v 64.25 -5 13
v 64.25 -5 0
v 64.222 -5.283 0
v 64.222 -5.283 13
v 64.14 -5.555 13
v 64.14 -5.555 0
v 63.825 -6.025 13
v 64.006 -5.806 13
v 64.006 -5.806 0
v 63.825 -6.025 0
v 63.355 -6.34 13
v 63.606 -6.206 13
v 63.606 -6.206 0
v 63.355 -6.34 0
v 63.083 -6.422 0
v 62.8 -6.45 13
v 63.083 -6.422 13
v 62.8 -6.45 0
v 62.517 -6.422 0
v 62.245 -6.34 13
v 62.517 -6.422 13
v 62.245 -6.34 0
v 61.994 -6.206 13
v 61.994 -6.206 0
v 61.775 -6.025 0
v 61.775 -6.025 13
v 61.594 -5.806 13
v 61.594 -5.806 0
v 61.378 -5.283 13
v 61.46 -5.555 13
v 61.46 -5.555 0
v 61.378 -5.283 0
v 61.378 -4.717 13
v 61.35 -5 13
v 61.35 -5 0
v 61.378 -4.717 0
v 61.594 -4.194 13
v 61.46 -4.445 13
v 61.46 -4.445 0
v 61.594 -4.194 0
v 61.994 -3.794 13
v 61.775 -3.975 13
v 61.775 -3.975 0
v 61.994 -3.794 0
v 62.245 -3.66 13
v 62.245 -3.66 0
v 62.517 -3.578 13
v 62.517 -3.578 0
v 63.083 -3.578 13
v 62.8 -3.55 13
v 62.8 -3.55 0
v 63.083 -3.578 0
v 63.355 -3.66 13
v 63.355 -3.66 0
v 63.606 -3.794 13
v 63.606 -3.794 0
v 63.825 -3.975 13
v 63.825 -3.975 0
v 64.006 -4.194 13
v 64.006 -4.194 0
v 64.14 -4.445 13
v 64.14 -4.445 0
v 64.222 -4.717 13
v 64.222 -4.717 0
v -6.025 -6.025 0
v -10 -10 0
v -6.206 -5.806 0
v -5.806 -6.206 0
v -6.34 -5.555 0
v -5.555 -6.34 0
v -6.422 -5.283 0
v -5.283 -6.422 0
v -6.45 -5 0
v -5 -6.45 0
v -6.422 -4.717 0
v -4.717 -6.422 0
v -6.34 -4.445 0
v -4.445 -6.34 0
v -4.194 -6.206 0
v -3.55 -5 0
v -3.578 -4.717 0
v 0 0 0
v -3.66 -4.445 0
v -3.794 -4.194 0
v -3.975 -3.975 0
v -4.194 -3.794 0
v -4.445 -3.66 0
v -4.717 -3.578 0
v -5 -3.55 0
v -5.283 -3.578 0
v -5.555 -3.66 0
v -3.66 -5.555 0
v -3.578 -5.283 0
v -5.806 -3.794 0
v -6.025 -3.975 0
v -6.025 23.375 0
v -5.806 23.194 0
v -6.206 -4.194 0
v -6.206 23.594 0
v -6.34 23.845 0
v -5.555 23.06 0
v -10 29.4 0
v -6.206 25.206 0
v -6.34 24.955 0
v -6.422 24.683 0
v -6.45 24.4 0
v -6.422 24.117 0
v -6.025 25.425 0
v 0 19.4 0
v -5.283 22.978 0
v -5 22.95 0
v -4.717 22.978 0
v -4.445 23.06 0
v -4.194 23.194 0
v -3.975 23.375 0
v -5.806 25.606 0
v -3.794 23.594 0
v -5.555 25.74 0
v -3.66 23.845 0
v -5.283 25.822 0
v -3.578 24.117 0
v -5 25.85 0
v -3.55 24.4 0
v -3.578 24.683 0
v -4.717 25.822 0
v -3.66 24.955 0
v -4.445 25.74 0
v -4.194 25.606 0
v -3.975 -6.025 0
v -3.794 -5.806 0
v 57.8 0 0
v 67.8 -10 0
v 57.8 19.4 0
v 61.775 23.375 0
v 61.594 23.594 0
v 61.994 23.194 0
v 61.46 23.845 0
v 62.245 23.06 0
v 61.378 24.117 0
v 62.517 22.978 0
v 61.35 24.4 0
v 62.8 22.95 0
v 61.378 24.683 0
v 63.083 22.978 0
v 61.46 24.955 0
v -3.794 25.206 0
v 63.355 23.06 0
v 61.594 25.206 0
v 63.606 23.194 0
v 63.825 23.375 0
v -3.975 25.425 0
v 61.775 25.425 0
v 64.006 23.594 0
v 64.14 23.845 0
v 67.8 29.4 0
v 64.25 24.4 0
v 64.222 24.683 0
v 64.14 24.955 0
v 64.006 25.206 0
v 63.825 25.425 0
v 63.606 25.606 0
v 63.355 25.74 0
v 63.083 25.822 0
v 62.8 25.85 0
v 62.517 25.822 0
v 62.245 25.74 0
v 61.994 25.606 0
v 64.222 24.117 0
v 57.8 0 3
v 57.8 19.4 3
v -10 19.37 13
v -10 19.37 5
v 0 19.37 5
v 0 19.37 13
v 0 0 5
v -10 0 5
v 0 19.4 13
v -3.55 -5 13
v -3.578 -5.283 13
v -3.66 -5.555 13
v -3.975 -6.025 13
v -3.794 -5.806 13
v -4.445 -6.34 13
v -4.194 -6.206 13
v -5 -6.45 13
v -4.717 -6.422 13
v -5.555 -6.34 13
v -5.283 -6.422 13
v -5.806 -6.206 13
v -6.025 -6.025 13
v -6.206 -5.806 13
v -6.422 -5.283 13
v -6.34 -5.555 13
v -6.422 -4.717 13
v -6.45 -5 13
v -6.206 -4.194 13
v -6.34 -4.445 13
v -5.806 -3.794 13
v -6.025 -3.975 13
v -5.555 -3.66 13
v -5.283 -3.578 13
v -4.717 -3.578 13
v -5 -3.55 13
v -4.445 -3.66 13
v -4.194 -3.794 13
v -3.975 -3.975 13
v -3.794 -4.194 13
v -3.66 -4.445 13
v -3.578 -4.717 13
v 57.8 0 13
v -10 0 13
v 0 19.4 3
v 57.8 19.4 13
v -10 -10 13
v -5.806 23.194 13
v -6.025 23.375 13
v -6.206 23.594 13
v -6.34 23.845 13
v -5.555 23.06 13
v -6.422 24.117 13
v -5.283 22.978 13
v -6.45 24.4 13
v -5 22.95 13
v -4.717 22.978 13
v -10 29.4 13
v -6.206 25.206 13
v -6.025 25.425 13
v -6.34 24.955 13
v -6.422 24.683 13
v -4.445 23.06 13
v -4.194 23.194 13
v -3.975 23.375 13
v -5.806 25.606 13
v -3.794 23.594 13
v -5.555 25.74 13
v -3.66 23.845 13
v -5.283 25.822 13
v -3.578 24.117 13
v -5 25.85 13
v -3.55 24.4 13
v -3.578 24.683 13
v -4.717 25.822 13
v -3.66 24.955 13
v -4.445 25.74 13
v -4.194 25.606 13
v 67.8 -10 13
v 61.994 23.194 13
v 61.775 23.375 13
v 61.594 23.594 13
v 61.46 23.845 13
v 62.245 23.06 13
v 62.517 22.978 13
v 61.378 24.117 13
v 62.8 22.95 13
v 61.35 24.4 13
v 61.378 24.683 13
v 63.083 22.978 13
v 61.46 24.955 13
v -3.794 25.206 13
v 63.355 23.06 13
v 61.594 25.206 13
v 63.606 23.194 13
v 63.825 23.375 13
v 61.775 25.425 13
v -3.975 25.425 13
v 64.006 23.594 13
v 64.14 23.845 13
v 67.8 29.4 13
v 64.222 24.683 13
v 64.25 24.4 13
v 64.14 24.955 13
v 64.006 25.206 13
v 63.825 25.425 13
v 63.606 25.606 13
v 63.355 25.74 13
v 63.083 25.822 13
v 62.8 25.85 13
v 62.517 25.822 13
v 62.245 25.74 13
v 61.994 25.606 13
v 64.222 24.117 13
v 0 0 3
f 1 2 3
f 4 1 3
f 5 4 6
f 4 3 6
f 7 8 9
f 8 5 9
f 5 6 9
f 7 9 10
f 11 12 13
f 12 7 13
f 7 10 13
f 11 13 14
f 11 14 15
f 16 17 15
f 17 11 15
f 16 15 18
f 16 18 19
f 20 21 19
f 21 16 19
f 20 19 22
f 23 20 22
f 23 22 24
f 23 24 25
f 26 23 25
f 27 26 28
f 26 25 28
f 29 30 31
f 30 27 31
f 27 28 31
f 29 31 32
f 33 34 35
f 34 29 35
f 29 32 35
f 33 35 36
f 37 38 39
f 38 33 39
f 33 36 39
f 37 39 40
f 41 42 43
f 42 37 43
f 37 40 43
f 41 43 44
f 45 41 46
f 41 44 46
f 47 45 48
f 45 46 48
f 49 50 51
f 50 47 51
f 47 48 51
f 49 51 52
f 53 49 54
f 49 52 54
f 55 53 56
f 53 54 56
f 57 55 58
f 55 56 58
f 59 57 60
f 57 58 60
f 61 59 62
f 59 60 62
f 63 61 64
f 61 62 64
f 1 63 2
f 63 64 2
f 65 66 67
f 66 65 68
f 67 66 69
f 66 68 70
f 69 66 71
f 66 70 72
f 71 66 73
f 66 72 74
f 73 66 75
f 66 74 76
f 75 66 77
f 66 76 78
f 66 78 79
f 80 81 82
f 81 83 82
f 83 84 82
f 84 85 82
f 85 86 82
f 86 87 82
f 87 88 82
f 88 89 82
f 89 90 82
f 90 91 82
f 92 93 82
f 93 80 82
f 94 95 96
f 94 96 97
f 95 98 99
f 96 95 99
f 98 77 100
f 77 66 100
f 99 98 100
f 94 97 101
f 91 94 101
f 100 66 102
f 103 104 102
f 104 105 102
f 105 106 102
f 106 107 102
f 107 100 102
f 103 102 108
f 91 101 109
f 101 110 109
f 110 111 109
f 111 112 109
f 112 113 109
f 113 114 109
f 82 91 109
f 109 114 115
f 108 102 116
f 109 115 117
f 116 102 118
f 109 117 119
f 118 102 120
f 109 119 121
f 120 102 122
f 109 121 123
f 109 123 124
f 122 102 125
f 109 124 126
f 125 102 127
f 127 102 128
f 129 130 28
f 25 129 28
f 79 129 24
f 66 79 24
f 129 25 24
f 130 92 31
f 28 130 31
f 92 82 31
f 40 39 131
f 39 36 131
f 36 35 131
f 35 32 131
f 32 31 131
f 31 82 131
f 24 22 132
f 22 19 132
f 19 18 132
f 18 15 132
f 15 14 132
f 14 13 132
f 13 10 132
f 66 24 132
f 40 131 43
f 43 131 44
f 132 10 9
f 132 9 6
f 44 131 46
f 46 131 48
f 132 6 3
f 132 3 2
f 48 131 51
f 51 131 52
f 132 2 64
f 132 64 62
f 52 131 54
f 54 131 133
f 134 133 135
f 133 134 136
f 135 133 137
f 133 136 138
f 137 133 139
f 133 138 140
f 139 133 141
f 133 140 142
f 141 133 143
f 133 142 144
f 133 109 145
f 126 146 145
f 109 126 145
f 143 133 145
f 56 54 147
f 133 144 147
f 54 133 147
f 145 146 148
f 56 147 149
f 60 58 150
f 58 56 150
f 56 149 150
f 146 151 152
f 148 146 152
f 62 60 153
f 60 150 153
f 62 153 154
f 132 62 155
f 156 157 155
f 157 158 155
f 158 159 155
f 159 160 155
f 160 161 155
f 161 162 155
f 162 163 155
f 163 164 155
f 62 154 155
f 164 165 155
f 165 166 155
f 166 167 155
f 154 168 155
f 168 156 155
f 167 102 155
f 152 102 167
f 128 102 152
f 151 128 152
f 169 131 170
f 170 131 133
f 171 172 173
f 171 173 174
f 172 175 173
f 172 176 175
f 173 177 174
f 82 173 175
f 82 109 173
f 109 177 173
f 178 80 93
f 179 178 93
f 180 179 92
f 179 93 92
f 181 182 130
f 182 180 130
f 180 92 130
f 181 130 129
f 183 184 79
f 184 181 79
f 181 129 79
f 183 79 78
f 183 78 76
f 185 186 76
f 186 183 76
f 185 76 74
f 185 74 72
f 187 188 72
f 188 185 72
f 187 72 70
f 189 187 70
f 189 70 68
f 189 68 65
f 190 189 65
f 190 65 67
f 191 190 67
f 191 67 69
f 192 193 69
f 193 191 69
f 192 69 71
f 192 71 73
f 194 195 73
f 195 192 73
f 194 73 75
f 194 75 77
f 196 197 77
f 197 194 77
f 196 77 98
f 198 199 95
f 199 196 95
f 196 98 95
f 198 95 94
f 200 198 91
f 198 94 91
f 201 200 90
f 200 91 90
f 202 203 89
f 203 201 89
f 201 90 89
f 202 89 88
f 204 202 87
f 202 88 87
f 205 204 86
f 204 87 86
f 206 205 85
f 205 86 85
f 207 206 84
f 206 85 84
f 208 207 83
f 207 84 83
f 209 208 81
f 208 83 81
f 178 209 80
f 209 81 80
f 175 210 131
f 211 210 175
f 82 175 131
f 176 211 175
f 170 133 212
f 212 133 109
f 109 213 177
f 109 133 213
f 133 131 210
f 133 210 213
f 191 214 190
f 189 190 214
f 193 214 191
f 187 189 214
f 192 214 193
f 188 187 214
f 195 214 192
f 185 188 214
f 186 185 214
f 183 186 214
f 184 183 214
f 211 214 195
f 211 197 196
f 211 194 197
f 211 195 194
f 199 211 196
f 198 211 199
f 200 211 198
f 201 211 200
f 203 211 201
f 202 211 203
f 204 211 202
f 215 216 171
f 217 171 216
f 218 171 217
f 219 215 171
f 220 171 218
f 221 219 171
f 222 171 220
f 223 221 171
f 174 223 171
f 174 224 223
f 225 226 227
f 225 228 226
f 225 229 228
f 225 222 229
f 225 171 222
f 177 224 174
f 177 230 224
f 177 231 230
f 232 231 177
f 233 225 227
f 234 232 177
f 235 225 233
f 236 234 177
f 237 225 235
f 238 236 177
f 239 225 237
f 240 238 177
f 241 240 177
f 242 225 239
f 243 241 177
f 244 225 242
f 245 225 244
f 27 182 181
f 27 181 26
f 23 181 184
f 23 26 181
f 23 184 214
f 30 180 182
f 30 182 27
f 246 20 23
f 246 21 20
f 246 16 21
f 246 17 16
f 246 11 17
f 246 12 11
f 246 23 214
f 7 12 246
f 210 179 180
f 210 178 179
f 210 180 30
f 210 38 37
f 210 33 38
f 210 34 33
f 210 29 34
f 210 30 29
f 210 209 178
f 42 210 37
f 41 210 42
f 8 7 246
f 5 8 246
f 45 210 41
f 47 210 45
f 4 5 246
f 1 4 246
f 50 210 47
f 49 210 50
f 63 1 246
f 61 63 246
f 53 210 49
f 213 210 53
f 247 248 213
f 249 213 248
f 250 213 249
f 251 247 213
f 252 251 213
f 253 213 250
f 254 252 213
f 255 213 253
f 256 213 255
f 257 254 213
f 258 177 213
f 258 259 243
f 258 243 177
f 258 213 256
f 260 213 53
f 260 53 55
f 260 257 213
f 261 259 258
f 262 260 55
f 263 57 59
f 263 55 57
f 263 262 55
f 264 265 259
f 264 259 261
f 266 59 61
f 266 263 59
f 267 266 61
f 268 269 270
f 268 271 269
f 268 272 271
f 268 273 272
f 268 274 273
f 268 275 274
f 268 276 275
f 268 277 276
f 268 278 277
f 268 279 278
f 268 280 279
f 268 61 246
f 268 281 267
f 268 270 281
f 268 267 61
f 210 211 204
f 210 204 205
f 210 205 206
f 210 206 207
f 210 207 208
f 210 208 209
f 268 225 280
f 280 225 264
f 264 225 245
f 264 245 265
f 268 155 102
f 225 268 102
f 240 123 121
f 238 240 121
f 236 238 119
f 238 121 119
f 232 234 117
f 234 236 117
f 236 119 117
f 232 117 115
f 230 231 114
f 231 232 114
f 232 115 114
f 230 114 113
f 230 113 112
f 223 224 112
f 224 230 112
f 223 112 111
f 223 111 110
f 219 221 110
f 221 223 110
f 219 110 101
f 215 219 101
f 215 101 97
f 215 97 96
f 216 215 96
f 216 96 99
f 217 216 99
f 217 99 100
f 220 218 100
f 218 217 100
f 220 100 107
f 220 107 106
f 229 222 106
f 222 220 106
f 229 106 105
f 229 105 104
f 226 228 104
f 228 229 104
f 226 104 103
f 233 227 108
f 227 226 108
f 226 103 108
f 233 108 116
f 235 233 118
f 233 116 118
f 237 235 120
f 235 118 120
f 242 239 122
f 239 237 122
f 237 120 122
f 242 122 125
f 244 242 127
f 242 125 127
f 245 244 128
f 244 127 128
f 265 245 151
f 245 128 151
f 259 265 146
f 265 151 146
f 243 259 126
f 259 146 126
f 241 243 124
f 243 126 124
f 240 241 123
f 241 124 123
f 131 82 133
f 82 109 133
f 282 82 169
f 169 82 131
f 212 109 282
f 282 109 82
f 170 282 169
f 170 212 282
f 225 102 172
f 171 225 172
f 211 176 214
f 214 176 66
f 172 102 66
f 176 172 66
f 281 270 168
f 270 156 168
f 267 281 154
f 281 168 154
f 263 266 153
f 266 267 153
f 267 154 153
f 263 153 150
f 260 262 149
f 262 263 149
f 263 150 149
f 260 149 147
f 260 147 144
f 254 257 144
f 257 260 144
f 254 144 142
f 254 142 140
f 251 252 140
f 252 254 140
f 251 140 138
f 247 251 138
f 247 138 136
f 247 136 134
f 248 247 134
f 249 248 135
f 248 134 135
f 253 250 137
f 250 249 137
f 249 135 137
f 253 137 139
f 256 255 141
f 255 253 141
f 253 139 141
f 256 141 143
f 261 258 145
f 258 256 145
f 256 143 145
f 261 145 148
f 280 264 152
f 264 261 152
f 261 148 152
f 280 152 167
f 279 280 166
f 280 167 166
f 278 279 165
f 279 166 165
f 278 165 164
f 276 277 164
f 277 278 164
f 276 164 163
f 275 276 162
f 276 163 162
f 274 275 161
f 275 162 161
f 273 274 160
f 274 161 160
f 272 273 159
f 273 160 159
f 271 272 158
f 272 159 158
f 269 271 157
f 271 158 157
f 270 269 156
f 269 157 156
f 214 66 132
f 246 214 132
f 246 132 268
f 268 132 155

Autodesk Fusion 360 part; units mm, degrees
sketch "Sketch1" plane through (0, 0, 0) normal (0, 0, 1) x (1, 0, 0)
  line L0 (0, 0) -> (57.8, 0)
  line L1 (57.8, 0) -> (57.8, 19.4)
  line L2 (57.8, 19.4) -> (0, 19.4)
  line L3 (0, 19.4) -> (0, 0)
  line L4 (-10, -10) -> (67.8, -10)
  line L5 (67.8, -10) -> (67.8, 29.4)
  line L6 (67.8, 29.4) -> (-10, 29.4)
  line L7 (-10, 29.4) -> (-10, -10)
  circle A0 centre (-5, 24.4) radius 1.45
  circle A1 centre (-5, -5) radius 1.45
  circle A2 centre (62.8, -5) radius 1.45
  circle A3 centre (62.8, 24.4) radius 1.45
  dimension "d1" = 57.8
  dimension "d2" = 19.4
  dimension "d3" = 10
  dimension "d4" = 10
  dimension "d5" = 10
  dimension "d6" = 10
  dimension "d7" = 2.9
  dimension "d8" = 5
  dimension "d9" = 5
  dimension "d10" = 2.9
  dimension "d11" = 5
  dimension "d12" = 5
  dimension "d13" = 2.9
  dimension "d14" = 5
  dimension "d15" = 5
  dimension "d16" = 2.9
  dimension "d17" = 5
  dimension "d18" = 5
extrude "Extrude1" add sketch "Sketch1" along normal blind 13 makes body 1
extrude "Extrude2" add sketch "Sketch1" along normal blind 3 separate body contours L0 L1 L2 L3 makes body 2
sketch "Sketch2" plane through (-10, 0, 0) normal (-1, 0, 0) x (0, -1, 0)
  line L0 (-29.4, 0) -> (10, 0)
  line L1 (10, 0) -> (10, 13)
  line L2 (10, 13) -> (-29.4, 13)
  line L3 (-29.4, 13) -> (-29.4, 0)
  line L4 (-19.3698, 13) -> (0, 13)
  line L5 (0, 13) -> (0, 5)
  line L6 (0, 5) -> (-19.3698, 5)
  line L7 (-19.3698, 5) -> (-19.3698, 13)
  point P0 (-19.4, 13)
  dimension "d24" = 8
  dimension "d25" = 0.0302
extrude "Extrude3" cut sketch "Sketch2" against normal blind 21 contours L2 L4 L5 L6 L7 bodies 1
